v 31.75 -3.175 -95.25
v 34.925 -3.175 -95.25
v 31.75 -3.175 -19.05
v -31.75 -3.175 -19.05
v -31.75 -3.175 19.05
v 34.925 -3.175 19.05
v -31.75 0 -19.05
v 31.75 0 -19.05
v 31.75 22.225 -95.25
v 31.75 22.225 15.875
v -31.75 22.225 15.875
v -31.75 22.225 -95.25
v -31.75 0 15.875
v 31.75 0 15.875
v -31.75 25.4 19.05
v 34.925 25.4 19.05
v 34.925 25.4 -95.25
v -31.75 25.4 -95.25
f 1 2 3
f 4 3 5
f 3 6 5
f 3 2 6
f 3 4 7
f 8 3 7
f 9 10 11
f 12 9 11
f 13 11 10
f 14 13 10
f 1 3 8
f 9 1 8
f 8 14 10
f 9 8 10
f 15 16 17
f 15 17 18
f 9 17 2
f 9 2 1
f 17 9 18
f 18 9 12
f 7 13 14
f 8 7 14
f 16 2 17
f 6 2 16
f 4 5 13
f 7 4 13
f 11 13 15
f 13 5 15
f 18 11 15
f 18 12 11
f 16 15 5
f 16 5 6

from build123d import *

# Parameters (mm, degrees)
F0_W     = 63.5
F0_H     = 38.1
F1_DEPTH = 3.175
F2_W     = 22.225
F2_H     = 38.1
F2_W_2   = 3.175
F3_DEPTH = 3.175
F5_DEPTH = 76.2
F6_W     = 63.5
F6_H     = 114.3
F6_W_2   = 3.175
F7_DEPTH = 3.175
F8_W     = 63.5
F8_H     = 22.225
F9_DEPTH = 3.175


with BuildPart() as f1:
    # F0 (on Front) → F1 (new body)
    with BuildSketch(Plane.XZ):
        Rectangle(F0_W, F0_H)
    extrude(amount=F1_DEPTH)

    # F2 (on face) → F3 (join)
    with BuildSketch(Plane.YZ.offset(31.75)):
        with Locations((11.1125, 0)):
            Rectangle(F2_W, F2_H)
        with Locations((-1.5875, 0)):
            Rectangle(F2_W_2, F2_H)
    extrude(amount=F3_DEPTH)

    # F4 (on face) → F5 (join)
    with BuildSketch(Plane(origin=(0, 0, -19.05), x_dir=(1, 0, 0), z_dir=(0, 0, -1))):
        Polygon((31.75, -22.225), (34.925, -22.225), (34.925, 3.175), (31.75, 3.175), (31.75, 0), align=None)
    extrude(amount=F5_DEPTH)

    # F6 (on face) → F7 (join)
    with BuildSketch(Plane(origin=(0, 22.225, 0), x_dir=(-1, 0, 0), z_dir=(0, 1, 0))):
        with Locations((0, -38.1)):
            Rectangle(F6_W, F6_H)
        with Locations((-33.3375, -38.1)):
            Rectangle(F6_W_2, F6_H)
    extrude(amount=F7_DEPTH)

    # F8 (on face) → F9 (join)
    with BuildSketch(Plane.XY.offset(19.05)):
        with Locations((0, 11.1125)):
            Rectangle(F8_W, F8_H)
    extrude(amount=-F9_DEPTH)


solid = f1.part
